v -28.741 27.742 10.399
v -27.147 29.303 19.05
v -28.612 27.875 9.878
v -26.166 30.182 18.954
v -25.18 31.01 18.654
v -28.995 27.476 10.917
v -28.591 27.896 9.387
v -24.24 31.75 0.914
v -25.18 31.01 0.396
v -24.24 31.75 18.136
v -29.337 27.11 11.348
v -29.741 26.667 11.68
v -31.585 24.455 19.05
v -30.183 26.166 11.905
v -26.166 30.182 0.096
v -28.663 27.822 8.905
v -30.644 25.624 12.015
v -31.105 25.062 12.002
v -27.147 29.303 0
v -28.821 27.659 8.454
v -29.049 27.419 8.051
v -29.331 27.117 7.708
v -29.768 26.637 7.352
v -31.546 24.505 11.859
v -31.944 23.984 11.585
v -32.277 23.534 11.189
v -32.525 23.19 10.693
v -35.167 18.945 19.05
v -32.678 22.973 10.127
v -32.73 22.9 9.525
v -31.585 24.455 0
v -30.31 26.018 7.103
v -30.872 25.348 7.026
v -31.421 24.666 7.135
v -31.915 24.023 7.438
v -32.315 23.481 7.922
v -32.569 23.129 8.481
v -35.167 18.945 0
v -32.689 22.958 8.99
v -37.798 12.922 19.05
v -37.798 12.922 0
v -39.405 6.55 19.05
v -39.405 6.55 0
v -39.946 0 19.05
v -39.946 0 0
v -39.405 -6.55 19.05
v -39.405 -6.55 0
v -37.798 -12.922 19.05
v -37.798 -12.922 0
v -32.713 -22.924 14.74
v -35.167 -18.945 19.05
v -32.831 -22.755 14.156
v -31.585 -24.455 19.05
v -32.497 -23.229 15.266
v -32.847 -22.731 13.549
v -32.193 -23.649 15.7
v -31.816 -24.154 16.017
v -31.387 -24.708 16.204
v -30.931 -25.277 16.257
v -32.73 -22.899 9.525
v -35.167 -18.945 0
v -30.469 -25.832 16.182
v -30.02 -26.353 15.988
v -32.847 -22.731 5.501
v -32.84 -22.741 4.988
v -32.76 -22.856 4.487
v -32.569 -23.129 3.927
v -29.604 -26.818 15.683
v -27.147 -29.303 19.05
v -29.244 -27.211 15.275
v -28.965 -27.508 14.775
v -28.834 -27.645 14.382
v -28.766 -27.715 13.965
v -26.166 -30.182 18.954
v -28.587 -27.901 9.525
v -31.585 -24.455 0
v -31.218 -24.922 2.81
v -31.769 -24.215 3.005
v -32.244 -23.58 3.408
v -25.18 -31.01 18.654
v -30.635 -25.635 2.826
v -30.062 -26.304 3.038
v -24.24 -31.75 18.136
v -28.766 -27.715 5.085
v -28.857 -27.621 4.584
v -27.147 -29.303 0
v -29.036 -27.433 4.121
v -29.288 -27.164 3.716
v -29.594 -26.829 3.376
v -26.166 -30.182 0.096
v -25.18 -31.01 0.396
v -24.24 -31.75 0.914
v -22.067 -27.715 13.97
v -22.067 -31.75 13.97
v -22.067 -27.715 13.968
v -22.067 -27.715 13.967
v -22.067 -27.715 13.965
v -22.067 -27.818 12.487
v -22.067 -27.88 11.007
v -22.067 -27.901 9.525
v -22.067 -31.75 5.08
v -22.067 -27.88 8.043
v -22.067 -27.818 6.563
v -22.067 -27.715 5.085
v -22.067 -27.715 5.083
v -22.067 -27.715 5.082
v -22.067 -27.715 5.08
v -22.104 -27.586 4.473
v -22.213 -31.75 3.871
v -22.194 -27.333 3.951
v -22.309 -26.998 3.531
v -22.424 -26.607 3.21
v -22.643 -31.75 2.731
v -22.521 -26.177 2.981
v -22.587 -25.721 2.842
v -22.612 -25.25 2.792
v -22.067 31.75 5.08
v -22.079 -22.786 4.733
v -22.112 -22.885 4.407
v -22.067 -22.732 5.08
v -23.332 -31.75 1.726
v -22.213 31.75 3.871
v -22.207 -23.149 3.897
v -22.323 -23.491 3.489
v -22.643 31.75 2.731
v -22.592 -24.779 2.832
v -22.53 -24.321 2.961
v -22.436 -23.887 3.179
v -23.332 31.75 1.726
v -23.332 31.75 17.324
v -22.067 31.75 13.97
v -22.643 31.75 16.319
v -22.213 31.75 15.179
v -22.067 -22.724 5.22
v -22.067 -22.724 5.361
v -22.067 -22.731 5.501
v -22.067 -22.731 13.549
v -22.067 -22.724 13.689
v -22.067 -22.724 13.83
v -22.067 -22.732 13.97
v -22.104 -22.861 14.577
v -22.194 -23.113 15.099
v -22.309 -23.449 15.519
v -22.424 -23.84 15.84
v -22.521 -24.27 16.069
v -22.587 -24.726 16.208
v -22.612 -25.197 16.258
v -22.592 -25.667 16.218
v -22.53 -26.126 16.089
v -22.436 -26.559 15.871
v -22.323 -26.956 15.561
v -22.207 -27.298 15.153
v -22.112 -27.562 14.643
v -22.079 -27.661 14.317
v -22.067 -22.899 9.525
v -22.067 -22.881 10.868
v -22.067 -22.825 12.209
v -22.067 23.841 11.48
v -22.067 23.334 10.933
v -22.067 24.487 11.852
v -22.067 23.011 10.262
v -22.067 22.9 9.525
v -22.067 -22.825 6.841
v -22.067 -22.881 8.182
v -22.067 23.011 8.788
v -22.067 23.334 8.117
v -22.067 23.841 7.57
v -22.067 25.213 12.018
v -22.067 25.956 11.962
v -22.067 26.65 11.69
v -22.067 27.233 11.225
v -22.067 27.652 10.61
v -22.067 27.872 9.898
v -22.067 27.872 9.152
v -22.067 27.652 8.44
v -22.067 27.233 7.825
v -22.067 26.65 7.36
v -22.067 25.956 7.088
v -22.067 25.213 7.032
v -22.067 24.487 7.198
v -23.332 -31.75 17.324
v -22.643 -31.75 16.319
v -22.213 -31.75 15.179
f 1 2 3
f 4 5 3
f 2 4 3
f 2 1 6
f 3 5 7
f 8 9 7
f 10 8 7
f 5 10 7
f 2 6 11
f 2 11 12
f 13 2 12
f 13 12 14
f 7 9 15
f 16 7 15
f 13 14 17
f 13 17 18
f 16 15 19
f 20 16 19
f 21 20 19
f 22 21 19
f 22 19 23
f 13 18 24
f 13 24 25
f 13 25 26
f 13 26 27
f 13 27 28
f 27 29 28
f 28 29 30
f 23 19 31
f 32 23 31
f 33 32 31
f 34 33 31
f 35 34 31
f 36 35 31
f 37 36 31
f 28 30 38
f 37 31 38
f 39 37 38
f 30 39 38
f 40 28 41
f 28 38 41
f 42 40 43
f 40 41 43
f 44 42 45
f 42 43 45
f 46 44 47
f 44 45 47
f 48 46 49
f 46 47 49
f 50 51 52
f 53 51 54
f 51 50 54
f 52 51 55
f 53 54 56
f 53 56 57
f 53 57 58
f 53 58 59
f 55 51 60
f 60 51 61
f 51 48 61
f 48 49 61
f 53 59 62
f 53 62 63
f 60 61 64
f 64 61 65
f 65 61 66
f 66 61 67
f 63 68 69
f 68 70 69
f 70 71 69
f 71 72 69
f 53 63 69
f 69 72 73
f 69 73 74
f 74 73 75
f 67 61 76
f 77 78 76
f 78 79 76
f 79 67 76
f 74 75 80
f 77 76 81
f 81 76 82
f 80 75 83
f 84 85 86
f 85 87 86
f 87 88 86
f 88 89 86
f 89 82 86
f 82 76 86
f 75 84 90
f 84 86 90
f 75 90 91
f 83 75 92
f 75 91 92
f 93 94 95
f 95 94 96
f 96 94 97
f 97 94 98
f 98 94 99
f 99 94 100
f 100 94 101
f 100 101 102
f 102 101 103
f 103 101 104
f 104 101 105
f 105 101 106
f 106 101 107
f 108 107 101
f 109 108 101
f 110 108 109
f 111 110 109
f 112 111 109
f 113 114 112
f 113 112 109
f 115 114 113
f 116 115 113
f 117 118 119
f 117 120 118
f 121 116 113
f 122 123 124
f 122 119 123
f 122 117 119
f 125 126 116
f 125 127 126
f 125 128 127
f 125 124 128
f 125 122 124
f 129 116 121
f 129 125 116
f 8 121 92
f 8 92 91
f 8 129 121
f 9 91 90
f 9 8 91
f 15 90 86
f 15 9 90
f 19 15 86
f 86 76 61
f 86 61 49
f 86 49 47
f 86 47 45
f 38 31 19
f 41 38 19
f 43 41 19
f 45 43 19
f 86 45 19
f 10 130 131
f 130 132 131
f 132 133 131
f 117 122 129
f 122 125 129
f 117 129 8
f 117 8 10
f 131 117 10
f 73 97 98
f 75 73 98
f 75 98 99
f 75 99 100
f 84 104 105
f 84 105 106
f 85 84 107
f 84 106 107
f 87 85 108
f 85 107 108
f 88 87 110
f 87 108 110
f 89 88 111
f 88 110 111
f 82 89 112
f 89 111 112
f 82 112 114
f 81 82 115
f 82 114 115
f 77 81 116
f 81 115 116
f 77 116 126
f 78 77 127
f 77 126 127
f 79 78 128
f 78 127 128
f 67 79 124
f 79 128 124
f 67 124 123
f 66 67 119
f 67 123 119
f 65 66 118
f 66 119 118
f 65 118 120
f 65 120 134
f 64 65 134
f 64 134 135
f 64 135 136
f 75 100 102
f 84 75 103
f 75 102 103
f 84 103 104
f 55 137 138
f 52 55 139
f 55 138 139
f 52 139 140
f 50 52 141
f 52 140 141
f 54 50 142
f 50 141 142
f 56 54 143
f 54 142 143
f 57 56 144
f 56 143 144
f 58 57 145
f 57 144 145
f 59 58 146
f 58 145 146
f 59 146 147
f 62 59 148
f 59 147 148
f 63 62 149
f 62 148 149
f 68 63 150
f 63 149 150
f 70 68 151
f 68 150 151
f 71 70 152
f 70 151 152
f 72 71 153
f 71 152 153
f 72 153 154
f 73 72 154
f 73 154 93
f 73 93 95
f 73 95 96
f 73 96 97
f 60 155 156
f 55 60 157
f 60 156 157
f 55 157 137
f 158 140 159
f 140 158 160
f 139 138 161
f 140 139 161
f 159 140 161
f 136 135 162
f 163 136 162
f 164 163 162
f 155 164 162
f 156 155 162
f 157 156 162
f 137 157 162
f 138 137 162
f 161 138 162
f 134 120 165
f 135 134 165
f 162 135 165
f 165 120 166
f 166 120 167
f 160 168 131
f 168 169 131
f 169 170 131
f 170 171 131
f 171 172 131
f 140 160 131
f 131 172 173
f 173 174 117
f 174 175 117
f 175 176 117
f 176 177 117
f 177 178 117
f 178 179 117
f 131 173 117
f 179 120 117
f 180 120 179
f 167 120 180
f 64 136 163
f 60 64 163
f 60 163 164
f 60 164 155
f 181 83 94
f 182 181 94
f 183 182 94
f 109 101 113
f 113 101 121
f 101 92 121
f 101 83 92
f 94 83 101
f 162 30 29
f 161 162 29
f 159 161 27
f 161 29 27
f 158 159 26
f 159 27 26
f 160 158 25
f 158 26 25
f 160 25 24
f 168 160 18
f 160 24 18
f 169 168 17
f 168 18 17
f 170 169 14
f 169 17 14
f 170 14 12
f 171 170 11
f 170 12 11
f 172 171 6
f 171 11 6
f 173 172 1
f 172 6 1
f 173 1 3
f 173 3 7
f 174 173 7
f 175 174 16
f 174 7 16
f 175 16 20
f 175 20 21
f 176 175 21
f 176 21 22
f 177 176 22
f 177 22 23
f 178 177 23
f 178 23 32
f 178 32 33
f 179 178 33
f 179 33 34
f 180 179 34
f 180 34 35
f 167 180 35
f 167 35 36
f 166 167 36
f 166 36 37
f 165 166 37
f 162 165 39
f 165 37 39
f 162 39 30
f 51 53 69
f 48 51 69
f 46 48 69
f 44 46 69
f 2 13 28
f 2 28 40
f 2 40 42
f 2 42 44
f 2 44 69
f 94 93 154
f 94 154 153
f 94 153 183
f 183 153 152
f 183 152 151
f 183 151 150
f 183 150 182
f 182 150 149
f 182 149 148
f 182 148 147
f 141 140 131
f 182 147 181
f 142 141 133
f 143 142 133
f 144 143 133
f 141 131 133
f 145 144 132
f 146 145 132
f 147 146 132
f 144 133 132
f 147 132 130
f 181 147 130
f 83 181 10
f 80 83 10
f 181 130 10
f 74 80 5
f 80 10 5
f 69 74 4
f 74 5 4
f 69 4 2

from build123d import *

# Parameters (mm, degrees)
F1_DEPTH    = 19.05
F3_DEPTH    = 25.4
F4_D        = 5
F4_DEPTH    = 15.6972
F4_TIP      = 1.5021515476
F5_T1_DEPTH = 88.9


# Not quite as in the source:
# - a fillet or chamfer that OpenCascade refuses, or shapes differently, is made with other operations: its cross-section is extruded or revolved along the edge and cut away or added


with BuildPart() as f1:
    # F0 (on Top) → F1 (new body)
    with BuildSketch(Plane.XY):
        with BuildLine():
            Line((-22.0673531294, 31.75), (-24.2402065279, 31.75))
            ThreePointArc((-24.2402065279, 31.75), (-39.9455894, 0), (-24.2402065279, -31.75))
            Line((-24.2402065279, -31.75), (-22.0673531294, -31.75))
            Line((-22.0673531294, -31.75), (-22.0673531294, 31.75))
        make_face()
    extrude(amount=F1_DEPTH)

    # F2 (on face) → F3 (cut)
    with BuildSketch(Plane.YZ.offset(-22.0673531294)):
        with BuildLine():
            ThreePointArc((-27.7153407028, 13.9654662391), (-27.8542875294, 11.747165191), (-27.90063, 9.525))
            Line((-27.90063, 9.525), (-22.89937, 9.525))
            ThreePointArc((-22.89937, 9.525), (-22.8573758972, 11.538656851), (-22.7314666127, 13.5488121361))
            ThreePointArc((-22.7314666127, 13.5488121361), (-25.0150766063, 16.2490762326), (-27.7153407028, 13.9654662391))
        make_face()
        with BuildLine():
            Line((-22.89937, 9.525), (-27.90063, 9.525))
            ThreePointArc((-27.90063, 9.525), (-27.8542875294, 7.302834809), (-27.7153407028, 5.0845337609))
            ThreePointArc((-27.7153407028, 5.0845337609), (-25.0150766063, 2.8009237674), (-22.7314666127, 5.5011878639))
            ThreePointArc((-22.7314666127, 5.5011878639), (-22.8573758972, 7.511343149), (-22.89937, 9.525))
        make_face()
    extrude(amount=-F3_DEPTH, mode=Mode.SUBTRACT)

    # F4
    with Locations(Plane.YZ.offset(-22.0673531294)):
        with Locations((25.4, 9.525)):
            Hole(F4_D / 2, depth=F4_DEPTH)
            with Locations((0, 0, -(F4_DEPTH + F4_TIP / 2))):  # 118° drill point
                Cone(0, F4_D / 2, F4_TIP, mode=Mode.SUBTRACT)

    # F5: fillet of radius 5.08 on 2 edges, made by hand

    # F5_s2 → F5_t1 (cut)
    with BuildSketch(Plane.XZ.offset(-44.45)):
        with BuildLine():
            ThreePointArc((-22.0673531294, 13.97), (-23.555250681, 17.5621024484), (-27.1473531294, 19.05))
            Line((-27.1473531294, 19.05), (-22.0673531294, 19.05))
            Line((-22.0673531294, 19.05), (-22.0673531294, 13.97))
        make_face()
        with BuildLine():
            ThreePointArc((-22.0673531294, 5.08), (-23.555250681, 1.4878975516), (-27.1473531294, 0))
            Line((-27.1473531294, 0), (-22.0673531294, 0))
            Line((-22.0673531294, 0), (-22.0673531294, 5.08))
        make_face()
    extrude(amount=F5_T1_DEPTH, mode=Mode.SUBTRACT)


solid = f1.part
